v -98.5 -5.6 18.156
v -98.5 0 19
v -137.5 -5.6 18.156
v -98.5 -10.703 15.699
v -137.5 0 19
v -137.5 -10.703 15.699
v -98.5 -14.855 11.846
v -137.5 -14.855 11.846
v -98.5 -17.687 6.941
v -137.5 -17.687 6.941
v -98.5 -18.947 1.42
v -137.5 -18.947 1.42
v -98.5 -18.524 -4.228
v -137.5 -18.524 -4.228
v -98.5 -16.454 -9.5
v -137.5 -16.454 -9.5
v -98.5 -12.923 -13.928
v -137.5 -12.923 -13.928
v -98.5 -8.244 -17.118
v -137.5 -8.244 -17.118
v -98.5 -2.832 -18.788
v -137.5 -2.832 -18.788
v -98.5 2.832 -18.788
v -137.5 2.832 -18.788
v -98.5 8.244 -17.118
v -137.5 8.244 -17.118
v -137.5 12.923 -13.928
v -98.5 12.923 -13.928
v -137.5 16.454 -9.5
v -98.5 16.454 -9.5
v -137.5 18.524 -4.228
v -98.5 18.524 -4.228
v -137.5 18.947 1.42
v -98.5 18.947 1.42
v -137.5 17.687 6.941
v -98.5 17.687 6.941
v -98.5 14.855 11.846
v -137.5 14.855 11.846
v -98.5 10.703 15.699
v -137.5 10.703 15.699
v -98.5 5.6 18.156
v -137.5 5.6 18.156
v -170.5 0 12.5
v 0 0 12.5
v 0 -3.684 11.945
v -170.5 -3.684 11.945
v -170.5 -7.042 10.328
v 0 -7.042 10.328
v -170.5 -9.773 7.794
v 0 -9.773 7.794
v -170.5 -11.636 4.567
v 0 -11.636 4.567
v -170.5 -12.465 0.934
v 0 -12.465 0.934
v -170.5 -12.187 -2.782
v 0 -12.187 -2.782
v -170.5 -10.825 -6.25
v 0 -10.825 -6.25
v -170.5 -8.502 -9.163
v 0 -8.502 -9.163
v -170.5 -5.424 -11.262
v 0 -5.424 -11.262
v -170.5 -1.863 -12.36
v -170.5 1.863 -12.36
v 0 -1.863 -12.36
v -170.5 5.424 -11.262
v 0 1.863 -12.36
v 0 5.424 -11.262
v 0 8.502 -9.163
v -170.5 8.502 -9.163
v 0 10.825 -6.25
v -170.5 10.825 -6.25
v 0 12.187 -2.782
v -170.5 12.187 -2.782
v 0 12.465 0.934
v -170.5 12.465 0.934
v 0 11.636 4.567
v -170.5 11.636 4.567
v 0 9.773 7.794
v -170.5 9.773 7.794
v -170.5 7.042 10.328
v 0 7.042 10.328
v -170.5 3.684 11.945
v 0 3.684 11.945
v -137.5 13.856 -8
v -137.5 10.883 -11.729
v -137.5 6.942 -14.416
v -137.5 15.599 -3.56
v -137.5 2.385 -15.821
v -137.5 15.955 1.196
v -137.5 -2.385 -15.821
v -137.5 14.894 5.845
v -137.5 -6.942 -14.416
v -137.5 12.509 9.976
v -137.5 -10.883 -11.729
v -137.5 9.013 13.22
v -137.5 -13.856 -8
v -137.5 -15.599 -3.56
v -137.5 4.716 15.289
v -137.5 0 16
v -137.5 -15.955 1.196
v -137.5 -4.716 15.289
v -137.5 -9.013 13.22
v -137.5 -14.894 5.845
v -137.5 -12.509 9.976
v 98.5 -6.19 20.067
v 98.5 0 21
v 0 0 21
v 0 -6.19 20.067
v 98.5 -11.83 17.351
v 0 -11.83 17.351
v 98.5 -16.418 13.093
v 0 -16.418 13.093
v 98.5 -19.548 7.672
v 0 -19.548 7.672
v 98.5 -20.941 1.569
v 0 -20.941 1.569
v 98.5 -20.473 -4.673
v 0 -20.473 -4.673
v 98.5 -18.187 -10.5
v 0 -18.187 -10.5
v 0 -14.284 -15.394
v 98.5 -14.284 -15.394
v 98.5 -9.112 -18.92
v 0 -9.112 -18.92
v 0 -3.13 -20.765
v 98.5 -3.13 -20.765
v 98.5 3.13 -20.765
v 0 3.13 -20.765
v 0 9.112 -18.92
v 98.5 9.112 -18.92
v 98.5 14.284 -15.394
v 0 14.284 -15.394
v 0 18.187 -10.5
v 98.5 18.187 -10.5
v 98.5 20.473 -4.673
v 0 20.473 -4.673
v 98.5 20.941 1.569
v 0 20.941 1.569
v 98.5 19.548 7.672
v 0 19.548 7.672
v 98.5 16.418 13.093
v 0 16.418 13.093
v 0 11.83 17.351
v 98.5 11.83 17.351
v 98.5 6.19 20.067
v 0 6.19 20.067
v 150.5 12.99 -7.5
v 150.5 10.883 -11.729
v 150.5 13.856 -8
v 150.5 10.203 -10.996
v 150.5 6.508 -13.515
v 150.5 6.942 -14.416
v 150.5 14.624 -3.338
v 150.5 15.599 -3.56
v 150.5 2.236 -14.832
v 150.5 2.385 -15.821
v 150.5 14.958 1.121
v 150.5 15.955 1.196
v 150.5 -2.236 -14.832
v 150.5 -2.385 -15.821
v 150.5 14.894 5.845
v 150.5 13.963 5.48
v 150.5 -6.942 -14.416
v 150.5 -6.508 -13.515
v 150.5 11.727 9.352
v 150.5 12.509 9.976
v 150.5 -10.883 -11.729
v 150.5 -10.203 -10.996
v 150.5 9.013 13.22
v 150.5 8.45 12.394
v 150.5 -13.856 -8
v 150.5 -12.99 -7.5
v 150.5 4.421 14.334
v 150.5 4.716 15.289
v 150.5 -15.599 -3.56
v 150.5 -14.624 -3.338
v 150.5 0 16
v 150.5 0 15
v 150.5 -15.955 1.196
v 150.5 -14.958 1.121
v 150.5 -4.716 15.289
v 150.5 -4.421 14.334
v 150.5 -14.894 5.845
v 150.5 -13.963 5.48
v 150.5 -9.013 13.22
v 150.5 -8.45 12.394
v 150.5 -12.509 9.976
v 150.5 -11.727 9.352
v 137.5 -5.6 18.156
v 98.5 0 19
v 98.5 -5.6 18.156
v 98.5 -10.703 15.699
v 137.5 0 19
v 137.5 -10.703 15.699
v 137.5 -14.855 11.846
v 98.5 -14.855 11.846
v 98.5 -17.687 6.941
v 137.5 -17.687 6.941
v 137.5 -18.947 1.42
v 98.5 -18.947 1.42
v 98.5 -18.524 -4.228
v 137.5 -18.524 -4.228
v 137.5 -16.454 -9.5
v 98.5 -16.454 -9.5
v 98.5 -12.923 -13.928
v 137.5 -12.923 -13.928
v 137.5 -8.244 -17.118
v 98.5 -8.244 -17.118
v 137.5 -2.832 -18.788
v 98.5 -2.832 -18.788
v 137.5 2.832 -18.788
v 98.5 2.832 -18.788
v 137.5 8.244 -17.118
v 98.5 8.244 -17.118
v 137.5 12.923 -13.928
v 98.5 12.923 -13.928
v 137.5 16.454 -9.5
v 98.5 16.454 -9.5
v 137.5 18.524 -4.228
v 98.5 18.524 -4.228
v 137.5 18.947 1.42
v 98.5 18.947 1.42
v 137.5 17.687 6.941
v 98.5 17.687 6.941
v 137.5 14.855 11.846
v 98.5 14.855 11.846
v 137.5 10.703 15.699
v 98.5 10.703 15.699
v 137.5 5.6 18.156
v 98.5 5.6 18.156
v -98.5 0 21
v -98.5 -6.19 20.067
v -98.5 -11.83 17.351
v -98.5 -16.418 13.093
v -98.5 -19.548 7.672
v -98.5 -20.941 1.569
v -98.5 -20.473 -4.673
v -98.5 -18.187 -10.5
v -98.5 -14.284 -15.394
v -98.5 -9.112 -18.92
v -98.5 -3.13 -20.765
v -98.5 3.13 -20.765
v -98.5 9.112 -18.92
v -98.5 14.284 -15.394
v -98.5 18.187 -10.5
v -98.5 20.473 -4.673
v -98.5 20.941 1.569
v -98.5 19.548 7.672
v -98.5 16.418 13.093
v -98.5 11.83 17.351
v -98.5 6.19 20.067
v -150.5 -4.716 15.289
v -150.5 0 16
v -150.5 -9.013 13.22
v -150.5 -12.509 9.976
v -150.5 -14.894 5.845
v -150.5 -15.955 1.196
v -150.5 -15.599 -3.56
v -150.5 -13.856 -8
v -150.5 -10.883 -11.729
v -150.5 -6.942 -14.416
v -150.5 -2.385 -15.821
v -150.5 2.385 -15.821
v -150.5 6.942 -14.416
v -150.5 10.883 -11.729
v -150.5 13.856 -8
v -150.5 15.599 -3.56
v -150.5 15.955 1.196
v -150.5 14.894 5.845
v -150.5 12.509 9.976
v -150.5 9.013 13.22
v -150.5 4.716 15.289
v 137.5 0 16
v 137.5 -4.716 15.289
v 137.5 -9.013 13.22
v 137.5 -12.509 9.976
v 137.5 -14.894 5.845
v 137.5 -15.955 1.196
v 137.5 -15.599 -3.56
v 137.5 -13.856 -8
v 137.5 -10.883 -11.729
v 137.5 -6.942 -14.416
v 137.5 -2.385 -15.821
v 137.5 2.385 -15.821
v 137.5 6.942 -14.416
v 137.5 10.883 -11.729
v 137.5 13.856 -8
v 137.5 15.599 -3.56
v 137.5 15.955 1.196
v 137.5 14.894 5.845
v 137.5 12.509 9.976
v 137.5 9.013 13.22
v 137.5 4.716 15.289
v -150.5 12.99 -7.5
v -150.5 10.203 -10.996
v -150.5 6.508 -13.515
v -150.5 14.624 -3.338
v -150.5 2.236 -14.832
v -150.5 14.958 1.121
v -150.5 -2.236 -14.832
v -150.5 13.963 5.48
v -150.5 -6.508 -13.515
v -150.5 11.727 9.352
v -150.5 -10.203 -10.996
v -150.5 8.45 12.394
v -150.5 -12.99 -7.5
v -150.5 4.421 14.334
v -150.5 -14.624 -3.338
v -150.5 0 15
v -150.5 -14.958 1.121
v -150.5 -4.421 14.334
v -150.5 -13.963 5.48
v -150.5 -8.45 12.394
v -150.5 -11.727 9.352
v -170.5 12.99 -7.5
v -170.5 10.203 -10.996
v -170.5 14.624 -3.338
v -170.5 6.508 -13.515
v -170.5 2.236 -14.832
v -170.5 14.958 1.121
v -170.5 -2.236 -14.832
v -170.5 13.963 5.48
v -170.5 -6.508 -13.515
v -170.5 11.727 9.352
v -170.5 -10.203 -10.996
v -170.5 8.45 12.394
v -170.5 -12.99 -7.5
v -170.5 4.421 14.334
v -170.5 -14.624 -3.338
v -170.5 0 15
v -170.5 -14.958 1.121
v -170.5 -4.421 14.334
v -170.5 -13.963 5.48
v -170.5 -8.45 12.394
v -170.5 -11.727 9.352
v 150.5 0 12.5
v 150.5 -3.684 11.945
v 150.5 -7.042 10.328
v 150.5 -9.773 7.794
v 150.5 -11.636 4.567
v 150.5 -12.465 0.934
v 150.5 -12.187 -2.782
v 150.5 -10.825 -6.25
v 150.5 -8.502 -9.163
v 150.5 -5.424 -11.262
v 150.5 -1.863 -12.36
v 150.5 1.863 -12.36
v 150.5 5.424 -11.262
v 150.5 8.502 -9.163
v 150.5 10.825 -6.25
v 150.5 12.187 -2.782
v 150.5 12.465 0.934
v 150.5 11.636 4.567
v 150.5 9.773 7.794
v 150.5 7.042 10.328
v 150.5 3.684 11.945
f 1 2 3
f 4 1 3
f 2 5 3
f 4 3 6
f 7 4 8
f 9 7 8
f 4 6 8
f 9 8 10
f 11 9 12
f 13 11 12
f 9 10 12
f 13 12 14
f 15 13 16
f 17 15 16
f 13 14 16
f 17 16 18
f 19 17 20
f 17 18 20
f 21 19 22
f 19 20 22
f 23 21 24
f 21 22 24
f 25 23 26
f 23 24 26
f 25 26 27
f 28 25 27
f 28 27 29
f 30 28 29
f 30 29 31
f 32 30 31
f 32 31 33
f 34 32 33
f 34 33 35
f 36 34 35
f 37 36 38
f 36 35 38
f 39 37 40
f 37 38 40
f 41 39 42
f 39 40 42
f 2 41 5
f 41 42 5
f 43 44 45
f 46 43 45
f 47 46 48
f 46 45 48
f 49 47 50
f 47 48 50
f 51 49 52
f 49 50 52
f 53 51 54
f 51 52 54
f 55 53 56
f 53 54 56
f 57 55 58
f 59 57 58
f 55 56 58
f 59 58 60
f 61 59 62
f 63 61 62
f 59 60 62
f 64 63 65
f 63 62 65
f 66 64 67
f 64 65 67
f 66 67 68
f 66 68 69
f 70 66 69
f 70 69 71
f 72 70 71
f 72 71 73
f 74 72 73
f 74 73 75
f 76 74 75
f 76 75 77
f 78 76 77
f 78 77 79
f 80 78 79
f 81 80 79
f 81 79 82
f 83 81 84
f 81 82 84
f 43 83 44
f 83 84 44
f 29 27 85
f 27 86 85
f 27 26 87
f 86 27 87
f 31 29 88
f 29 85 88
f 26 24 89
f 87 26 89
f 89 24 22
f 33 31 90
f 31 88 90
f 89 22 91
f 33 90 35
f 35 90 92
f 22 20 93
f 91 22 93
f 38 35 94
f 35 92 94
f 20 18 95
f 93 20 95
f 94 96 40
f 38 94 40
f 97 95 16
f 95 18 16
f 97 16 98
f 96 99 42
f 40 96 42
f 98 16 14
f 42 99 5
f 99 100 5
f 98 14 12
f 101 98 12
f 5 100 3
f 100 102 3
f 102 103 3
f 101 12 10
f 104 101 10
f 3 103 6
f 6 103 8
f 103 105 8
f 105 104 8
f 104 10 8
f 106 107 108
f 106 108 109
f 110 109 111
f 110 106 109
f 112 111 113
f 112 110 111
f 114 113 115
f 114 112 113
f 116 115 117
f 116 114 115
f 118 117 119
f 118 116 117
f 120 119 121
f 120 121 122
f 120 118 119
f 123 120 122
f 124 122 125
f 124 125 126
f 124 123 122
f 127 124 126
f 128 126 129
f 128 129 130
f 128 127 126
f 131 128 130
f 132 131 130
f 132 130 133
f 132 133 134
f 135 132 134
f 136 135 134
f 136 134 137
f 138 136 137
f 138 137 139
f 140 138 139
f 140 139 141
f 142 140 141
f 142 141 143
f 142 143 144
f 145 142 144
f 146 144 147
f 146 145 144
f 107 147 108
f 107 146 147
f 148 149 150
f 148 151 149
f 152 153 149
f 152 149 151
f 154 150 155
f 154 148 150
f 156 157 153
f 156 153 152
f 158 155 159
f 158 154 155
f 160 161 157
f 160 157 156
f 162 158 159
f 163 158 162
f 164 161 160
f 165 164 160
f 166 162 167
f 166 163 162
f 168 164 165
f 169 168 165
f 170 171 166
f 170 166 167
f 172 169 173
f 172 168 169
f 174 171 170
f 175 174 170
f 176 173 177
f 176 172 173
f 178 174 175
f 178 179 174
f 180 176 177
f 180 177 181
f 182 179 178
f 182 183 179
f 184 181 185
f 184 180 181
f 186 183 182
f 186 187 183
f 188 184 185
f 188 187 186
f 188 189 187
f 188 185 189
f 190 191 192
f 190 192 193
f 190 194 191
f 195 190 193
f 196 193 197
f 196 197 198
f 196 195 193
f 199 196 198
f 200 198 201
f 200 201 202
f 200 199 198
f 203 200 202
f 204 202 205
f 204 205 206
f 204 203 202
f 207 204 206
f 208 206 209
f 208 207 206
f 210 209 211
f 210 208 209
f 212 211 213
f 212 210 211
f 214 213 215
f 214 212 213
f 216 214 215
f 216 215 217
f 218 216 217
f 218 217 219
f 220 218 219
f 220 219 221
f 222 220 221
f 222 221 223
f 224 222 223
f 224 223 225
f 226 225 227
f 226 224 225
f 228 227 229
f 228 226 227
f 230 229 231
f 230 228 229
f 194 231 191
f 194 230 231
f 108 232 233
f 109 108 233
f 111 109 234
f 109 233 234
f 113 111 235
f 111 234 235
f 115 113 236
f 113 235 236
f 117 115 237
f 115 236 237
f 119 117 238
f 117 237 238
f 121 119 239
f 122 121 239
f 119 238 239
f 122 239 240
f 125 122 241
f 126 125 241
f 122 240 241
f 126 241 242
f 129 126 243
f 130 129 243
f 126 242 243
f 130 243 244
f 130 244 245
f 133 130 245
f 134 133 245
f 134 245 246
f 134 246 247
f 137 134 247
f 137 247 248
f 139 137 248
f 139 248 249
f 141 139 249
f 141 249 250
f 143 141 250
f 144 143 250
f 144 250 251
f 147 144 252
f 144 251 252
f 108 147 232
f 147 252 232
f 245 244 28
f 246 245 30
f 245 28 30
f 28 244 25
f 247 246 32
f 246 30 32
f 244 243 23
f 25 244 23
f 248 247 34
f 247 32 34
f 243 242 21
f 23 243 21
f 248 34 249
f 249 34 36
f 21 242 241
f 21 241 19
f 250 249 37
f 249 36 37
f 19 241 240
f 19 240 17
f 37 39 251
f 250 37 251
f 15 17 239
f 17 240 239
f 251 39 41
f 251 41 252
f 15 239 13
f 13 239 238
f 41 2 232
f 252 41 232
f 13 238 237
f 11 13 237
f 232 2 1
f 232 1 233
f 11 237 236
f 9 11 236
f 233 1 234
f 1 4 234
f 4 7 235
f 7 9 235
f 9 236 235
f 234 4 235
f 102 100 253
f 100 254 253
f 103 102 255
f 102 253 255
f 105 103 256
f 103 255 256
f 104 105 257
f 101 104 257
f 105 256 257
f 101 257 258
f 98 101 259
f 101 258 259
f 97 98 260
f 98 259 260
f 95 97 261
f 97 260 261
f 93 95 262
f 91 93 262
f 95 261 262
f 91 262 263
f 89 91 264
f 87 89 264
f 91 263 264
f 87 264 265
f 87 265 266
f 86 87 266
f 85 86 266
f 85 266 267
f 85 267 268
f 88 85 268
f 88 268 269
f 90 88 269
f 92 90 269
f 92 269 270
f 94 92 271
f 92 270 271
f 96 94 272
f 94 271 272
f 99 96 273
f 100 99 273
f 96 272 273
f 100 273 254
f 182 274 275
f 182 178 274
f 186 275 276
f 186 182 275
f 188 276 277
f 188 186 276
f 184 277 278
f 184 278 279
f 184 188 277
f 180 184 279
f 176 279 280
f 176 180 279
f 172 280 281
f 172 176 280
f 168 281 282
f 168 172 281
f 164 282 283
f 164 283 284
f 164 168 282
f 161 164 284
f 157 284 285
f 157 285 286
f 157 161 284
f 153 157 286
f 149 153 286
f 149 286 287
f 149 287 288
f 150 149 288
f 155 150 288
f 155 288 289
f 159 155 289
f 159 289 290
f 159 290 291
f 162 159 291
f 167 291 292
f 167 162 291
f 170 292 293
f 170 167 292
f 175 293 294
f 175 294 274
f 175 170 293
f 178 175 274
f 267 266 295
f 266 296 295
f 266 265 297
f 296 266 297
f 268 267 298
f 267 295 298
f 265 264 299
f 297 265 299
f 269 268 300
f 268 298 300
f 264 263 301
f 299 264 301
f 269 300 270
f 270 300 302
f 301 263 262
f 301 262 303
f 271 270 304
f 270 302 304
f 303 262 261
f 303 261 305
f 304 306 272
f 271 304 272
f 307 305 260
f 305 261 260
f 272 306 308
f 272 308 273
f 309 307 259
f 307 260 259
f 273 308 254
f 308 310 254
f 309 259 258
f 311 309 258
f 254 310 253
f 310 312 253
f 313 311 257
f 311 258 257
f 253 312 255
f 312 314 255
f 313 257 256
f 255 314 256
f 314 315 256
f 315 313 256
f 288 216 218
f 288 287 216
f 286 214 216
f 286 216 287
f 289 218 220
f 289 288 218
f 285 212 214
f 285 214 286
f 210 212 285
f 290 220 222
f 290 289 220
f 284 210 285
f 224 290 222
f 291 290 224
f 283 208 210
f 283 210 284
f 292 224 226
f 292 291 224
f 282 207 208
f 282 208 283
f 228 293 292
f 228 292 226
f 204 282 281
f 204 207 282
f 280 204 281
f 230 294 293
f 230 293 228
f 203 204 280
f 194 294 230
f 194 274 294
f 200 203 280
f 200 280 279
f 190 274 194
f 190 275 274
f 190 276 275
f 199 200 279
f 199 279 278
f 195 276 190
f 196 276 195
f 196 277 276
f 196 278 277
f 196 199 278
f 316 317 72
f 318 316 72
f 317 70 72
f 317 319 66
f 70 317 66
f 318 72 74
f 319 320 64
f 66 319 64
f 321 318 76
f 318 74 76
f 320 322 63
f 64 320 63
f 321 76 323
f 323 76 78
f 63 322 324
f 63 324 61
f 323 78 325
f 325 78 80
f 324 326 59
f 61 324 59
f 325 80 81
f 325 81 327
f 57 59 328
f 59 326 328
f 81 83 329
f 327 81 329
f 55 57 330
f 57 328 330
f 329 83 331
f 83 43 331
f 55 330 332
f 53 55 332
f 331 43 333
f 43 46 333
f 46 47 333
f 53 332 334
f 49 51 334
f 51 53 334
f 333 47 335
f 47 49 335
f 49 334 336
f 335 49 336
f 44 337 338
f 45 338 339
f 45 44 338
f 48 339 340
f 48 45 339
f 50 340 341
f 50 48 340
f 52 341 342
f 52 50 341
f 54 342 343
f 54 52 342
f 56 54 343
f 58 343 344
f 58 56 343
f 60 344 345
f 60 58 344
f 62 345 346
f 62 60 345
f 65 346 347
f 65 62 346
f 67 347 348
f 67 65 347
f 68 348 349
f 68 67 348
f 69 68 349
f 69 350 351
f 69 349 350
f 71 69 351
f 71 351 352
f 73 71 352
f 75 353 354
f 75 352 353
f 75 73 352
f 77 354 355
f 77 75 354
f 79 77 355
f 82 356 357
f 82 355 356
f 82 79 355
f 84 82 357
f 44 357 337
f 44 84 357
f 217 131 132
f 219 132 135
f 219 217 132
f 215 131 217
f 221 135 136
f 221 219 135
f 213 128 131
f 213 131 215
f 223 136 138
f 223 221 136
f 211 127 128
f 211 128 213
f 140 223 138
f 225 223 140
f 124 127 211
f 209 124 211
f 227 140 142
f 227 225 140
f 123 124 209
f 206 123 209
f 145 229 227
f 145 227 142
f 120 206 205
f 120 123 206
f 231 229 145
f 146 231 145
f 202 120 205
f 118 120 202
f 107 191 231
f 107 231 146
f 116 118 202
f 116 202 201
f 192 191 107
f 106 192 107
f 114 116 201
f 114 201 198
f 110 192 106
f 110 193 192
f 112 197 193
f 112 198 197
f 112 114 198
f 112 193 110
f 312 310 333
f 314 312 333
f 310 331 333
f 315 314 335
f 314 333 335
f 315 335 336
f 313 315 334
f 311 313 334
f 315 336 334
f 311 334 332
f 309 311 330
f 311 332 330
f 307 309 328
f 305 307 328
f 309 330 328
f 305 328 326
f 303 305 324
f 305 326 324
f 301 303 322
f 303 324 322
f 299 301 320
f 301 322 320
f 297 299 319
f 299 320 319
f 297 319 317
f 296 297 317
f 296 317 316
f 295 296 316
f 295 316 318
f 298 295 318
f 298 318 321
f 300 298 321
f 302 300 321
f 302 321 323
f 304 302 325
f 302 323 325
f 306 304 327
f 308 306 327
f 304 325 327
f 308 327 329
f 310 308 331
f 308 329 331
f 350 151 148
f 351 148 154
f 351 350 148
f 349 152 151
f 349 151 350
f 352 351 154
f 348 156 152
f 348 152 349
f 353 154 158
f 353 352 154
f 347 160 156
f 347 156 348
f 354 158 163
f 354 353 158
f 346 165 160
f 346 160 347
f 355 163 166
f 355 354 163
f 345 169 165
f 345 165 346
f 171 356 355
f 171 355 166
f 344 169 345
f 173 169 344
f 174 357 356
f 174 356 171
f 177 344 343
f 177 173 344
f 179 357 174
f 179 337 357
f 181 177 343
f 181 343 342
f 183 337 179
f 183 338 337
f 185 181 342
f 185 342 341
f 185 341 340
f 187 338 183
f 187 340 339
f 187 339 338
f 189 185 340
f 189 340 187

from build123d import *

# Parameters (mm, degrees)
SKETCH2_R      = 15
EXTRUDE1_DEPTH = 20


with BuildPart() as part:
    # Sketch1 → Revolve1 (revolve)
    with BuildSketch(Plane.XY, mode=Mode.PRIVATE) as revolve1_sk:
        Polygon((0, 21), (-98.5, 21), (-98.5, 19), (-137.5, 19), (-137.5, 16), (-150.5, 16), (-150.5, 15), (-170.5, 15), (-170.5, 12.5), (0, 12.5), align=None)
    revolve1 = revolve(revolve1_sk.sketch.rotate(Axis((0, 0, 0), (1, 0, 0)), 90), axis=Axis((0, 0, 0), (1, 0, 0)))

    # Mirror1: Revolve1 across plane
    add(revolve1.mirror(Plane(origin=(0, 0, 0), x_dir=(0, 0, 1), z_dir=(1, 0, 0))))

    # Sketch2 → Extrude1 (cut)
    with BuildSketch(Plane(origin=(170.5, 0, 0), x_dir=(0, 0, -1), z_dir=(1, 0, 0))):
        with Locations(Location((0, 0, 0), (0, 0, 180))):
            Circle(SKETCH2_R)
    extrude(amount=-EXTRUDE1_DEPTH, mode=Mode.SUBTRACT)


solid = part.part
